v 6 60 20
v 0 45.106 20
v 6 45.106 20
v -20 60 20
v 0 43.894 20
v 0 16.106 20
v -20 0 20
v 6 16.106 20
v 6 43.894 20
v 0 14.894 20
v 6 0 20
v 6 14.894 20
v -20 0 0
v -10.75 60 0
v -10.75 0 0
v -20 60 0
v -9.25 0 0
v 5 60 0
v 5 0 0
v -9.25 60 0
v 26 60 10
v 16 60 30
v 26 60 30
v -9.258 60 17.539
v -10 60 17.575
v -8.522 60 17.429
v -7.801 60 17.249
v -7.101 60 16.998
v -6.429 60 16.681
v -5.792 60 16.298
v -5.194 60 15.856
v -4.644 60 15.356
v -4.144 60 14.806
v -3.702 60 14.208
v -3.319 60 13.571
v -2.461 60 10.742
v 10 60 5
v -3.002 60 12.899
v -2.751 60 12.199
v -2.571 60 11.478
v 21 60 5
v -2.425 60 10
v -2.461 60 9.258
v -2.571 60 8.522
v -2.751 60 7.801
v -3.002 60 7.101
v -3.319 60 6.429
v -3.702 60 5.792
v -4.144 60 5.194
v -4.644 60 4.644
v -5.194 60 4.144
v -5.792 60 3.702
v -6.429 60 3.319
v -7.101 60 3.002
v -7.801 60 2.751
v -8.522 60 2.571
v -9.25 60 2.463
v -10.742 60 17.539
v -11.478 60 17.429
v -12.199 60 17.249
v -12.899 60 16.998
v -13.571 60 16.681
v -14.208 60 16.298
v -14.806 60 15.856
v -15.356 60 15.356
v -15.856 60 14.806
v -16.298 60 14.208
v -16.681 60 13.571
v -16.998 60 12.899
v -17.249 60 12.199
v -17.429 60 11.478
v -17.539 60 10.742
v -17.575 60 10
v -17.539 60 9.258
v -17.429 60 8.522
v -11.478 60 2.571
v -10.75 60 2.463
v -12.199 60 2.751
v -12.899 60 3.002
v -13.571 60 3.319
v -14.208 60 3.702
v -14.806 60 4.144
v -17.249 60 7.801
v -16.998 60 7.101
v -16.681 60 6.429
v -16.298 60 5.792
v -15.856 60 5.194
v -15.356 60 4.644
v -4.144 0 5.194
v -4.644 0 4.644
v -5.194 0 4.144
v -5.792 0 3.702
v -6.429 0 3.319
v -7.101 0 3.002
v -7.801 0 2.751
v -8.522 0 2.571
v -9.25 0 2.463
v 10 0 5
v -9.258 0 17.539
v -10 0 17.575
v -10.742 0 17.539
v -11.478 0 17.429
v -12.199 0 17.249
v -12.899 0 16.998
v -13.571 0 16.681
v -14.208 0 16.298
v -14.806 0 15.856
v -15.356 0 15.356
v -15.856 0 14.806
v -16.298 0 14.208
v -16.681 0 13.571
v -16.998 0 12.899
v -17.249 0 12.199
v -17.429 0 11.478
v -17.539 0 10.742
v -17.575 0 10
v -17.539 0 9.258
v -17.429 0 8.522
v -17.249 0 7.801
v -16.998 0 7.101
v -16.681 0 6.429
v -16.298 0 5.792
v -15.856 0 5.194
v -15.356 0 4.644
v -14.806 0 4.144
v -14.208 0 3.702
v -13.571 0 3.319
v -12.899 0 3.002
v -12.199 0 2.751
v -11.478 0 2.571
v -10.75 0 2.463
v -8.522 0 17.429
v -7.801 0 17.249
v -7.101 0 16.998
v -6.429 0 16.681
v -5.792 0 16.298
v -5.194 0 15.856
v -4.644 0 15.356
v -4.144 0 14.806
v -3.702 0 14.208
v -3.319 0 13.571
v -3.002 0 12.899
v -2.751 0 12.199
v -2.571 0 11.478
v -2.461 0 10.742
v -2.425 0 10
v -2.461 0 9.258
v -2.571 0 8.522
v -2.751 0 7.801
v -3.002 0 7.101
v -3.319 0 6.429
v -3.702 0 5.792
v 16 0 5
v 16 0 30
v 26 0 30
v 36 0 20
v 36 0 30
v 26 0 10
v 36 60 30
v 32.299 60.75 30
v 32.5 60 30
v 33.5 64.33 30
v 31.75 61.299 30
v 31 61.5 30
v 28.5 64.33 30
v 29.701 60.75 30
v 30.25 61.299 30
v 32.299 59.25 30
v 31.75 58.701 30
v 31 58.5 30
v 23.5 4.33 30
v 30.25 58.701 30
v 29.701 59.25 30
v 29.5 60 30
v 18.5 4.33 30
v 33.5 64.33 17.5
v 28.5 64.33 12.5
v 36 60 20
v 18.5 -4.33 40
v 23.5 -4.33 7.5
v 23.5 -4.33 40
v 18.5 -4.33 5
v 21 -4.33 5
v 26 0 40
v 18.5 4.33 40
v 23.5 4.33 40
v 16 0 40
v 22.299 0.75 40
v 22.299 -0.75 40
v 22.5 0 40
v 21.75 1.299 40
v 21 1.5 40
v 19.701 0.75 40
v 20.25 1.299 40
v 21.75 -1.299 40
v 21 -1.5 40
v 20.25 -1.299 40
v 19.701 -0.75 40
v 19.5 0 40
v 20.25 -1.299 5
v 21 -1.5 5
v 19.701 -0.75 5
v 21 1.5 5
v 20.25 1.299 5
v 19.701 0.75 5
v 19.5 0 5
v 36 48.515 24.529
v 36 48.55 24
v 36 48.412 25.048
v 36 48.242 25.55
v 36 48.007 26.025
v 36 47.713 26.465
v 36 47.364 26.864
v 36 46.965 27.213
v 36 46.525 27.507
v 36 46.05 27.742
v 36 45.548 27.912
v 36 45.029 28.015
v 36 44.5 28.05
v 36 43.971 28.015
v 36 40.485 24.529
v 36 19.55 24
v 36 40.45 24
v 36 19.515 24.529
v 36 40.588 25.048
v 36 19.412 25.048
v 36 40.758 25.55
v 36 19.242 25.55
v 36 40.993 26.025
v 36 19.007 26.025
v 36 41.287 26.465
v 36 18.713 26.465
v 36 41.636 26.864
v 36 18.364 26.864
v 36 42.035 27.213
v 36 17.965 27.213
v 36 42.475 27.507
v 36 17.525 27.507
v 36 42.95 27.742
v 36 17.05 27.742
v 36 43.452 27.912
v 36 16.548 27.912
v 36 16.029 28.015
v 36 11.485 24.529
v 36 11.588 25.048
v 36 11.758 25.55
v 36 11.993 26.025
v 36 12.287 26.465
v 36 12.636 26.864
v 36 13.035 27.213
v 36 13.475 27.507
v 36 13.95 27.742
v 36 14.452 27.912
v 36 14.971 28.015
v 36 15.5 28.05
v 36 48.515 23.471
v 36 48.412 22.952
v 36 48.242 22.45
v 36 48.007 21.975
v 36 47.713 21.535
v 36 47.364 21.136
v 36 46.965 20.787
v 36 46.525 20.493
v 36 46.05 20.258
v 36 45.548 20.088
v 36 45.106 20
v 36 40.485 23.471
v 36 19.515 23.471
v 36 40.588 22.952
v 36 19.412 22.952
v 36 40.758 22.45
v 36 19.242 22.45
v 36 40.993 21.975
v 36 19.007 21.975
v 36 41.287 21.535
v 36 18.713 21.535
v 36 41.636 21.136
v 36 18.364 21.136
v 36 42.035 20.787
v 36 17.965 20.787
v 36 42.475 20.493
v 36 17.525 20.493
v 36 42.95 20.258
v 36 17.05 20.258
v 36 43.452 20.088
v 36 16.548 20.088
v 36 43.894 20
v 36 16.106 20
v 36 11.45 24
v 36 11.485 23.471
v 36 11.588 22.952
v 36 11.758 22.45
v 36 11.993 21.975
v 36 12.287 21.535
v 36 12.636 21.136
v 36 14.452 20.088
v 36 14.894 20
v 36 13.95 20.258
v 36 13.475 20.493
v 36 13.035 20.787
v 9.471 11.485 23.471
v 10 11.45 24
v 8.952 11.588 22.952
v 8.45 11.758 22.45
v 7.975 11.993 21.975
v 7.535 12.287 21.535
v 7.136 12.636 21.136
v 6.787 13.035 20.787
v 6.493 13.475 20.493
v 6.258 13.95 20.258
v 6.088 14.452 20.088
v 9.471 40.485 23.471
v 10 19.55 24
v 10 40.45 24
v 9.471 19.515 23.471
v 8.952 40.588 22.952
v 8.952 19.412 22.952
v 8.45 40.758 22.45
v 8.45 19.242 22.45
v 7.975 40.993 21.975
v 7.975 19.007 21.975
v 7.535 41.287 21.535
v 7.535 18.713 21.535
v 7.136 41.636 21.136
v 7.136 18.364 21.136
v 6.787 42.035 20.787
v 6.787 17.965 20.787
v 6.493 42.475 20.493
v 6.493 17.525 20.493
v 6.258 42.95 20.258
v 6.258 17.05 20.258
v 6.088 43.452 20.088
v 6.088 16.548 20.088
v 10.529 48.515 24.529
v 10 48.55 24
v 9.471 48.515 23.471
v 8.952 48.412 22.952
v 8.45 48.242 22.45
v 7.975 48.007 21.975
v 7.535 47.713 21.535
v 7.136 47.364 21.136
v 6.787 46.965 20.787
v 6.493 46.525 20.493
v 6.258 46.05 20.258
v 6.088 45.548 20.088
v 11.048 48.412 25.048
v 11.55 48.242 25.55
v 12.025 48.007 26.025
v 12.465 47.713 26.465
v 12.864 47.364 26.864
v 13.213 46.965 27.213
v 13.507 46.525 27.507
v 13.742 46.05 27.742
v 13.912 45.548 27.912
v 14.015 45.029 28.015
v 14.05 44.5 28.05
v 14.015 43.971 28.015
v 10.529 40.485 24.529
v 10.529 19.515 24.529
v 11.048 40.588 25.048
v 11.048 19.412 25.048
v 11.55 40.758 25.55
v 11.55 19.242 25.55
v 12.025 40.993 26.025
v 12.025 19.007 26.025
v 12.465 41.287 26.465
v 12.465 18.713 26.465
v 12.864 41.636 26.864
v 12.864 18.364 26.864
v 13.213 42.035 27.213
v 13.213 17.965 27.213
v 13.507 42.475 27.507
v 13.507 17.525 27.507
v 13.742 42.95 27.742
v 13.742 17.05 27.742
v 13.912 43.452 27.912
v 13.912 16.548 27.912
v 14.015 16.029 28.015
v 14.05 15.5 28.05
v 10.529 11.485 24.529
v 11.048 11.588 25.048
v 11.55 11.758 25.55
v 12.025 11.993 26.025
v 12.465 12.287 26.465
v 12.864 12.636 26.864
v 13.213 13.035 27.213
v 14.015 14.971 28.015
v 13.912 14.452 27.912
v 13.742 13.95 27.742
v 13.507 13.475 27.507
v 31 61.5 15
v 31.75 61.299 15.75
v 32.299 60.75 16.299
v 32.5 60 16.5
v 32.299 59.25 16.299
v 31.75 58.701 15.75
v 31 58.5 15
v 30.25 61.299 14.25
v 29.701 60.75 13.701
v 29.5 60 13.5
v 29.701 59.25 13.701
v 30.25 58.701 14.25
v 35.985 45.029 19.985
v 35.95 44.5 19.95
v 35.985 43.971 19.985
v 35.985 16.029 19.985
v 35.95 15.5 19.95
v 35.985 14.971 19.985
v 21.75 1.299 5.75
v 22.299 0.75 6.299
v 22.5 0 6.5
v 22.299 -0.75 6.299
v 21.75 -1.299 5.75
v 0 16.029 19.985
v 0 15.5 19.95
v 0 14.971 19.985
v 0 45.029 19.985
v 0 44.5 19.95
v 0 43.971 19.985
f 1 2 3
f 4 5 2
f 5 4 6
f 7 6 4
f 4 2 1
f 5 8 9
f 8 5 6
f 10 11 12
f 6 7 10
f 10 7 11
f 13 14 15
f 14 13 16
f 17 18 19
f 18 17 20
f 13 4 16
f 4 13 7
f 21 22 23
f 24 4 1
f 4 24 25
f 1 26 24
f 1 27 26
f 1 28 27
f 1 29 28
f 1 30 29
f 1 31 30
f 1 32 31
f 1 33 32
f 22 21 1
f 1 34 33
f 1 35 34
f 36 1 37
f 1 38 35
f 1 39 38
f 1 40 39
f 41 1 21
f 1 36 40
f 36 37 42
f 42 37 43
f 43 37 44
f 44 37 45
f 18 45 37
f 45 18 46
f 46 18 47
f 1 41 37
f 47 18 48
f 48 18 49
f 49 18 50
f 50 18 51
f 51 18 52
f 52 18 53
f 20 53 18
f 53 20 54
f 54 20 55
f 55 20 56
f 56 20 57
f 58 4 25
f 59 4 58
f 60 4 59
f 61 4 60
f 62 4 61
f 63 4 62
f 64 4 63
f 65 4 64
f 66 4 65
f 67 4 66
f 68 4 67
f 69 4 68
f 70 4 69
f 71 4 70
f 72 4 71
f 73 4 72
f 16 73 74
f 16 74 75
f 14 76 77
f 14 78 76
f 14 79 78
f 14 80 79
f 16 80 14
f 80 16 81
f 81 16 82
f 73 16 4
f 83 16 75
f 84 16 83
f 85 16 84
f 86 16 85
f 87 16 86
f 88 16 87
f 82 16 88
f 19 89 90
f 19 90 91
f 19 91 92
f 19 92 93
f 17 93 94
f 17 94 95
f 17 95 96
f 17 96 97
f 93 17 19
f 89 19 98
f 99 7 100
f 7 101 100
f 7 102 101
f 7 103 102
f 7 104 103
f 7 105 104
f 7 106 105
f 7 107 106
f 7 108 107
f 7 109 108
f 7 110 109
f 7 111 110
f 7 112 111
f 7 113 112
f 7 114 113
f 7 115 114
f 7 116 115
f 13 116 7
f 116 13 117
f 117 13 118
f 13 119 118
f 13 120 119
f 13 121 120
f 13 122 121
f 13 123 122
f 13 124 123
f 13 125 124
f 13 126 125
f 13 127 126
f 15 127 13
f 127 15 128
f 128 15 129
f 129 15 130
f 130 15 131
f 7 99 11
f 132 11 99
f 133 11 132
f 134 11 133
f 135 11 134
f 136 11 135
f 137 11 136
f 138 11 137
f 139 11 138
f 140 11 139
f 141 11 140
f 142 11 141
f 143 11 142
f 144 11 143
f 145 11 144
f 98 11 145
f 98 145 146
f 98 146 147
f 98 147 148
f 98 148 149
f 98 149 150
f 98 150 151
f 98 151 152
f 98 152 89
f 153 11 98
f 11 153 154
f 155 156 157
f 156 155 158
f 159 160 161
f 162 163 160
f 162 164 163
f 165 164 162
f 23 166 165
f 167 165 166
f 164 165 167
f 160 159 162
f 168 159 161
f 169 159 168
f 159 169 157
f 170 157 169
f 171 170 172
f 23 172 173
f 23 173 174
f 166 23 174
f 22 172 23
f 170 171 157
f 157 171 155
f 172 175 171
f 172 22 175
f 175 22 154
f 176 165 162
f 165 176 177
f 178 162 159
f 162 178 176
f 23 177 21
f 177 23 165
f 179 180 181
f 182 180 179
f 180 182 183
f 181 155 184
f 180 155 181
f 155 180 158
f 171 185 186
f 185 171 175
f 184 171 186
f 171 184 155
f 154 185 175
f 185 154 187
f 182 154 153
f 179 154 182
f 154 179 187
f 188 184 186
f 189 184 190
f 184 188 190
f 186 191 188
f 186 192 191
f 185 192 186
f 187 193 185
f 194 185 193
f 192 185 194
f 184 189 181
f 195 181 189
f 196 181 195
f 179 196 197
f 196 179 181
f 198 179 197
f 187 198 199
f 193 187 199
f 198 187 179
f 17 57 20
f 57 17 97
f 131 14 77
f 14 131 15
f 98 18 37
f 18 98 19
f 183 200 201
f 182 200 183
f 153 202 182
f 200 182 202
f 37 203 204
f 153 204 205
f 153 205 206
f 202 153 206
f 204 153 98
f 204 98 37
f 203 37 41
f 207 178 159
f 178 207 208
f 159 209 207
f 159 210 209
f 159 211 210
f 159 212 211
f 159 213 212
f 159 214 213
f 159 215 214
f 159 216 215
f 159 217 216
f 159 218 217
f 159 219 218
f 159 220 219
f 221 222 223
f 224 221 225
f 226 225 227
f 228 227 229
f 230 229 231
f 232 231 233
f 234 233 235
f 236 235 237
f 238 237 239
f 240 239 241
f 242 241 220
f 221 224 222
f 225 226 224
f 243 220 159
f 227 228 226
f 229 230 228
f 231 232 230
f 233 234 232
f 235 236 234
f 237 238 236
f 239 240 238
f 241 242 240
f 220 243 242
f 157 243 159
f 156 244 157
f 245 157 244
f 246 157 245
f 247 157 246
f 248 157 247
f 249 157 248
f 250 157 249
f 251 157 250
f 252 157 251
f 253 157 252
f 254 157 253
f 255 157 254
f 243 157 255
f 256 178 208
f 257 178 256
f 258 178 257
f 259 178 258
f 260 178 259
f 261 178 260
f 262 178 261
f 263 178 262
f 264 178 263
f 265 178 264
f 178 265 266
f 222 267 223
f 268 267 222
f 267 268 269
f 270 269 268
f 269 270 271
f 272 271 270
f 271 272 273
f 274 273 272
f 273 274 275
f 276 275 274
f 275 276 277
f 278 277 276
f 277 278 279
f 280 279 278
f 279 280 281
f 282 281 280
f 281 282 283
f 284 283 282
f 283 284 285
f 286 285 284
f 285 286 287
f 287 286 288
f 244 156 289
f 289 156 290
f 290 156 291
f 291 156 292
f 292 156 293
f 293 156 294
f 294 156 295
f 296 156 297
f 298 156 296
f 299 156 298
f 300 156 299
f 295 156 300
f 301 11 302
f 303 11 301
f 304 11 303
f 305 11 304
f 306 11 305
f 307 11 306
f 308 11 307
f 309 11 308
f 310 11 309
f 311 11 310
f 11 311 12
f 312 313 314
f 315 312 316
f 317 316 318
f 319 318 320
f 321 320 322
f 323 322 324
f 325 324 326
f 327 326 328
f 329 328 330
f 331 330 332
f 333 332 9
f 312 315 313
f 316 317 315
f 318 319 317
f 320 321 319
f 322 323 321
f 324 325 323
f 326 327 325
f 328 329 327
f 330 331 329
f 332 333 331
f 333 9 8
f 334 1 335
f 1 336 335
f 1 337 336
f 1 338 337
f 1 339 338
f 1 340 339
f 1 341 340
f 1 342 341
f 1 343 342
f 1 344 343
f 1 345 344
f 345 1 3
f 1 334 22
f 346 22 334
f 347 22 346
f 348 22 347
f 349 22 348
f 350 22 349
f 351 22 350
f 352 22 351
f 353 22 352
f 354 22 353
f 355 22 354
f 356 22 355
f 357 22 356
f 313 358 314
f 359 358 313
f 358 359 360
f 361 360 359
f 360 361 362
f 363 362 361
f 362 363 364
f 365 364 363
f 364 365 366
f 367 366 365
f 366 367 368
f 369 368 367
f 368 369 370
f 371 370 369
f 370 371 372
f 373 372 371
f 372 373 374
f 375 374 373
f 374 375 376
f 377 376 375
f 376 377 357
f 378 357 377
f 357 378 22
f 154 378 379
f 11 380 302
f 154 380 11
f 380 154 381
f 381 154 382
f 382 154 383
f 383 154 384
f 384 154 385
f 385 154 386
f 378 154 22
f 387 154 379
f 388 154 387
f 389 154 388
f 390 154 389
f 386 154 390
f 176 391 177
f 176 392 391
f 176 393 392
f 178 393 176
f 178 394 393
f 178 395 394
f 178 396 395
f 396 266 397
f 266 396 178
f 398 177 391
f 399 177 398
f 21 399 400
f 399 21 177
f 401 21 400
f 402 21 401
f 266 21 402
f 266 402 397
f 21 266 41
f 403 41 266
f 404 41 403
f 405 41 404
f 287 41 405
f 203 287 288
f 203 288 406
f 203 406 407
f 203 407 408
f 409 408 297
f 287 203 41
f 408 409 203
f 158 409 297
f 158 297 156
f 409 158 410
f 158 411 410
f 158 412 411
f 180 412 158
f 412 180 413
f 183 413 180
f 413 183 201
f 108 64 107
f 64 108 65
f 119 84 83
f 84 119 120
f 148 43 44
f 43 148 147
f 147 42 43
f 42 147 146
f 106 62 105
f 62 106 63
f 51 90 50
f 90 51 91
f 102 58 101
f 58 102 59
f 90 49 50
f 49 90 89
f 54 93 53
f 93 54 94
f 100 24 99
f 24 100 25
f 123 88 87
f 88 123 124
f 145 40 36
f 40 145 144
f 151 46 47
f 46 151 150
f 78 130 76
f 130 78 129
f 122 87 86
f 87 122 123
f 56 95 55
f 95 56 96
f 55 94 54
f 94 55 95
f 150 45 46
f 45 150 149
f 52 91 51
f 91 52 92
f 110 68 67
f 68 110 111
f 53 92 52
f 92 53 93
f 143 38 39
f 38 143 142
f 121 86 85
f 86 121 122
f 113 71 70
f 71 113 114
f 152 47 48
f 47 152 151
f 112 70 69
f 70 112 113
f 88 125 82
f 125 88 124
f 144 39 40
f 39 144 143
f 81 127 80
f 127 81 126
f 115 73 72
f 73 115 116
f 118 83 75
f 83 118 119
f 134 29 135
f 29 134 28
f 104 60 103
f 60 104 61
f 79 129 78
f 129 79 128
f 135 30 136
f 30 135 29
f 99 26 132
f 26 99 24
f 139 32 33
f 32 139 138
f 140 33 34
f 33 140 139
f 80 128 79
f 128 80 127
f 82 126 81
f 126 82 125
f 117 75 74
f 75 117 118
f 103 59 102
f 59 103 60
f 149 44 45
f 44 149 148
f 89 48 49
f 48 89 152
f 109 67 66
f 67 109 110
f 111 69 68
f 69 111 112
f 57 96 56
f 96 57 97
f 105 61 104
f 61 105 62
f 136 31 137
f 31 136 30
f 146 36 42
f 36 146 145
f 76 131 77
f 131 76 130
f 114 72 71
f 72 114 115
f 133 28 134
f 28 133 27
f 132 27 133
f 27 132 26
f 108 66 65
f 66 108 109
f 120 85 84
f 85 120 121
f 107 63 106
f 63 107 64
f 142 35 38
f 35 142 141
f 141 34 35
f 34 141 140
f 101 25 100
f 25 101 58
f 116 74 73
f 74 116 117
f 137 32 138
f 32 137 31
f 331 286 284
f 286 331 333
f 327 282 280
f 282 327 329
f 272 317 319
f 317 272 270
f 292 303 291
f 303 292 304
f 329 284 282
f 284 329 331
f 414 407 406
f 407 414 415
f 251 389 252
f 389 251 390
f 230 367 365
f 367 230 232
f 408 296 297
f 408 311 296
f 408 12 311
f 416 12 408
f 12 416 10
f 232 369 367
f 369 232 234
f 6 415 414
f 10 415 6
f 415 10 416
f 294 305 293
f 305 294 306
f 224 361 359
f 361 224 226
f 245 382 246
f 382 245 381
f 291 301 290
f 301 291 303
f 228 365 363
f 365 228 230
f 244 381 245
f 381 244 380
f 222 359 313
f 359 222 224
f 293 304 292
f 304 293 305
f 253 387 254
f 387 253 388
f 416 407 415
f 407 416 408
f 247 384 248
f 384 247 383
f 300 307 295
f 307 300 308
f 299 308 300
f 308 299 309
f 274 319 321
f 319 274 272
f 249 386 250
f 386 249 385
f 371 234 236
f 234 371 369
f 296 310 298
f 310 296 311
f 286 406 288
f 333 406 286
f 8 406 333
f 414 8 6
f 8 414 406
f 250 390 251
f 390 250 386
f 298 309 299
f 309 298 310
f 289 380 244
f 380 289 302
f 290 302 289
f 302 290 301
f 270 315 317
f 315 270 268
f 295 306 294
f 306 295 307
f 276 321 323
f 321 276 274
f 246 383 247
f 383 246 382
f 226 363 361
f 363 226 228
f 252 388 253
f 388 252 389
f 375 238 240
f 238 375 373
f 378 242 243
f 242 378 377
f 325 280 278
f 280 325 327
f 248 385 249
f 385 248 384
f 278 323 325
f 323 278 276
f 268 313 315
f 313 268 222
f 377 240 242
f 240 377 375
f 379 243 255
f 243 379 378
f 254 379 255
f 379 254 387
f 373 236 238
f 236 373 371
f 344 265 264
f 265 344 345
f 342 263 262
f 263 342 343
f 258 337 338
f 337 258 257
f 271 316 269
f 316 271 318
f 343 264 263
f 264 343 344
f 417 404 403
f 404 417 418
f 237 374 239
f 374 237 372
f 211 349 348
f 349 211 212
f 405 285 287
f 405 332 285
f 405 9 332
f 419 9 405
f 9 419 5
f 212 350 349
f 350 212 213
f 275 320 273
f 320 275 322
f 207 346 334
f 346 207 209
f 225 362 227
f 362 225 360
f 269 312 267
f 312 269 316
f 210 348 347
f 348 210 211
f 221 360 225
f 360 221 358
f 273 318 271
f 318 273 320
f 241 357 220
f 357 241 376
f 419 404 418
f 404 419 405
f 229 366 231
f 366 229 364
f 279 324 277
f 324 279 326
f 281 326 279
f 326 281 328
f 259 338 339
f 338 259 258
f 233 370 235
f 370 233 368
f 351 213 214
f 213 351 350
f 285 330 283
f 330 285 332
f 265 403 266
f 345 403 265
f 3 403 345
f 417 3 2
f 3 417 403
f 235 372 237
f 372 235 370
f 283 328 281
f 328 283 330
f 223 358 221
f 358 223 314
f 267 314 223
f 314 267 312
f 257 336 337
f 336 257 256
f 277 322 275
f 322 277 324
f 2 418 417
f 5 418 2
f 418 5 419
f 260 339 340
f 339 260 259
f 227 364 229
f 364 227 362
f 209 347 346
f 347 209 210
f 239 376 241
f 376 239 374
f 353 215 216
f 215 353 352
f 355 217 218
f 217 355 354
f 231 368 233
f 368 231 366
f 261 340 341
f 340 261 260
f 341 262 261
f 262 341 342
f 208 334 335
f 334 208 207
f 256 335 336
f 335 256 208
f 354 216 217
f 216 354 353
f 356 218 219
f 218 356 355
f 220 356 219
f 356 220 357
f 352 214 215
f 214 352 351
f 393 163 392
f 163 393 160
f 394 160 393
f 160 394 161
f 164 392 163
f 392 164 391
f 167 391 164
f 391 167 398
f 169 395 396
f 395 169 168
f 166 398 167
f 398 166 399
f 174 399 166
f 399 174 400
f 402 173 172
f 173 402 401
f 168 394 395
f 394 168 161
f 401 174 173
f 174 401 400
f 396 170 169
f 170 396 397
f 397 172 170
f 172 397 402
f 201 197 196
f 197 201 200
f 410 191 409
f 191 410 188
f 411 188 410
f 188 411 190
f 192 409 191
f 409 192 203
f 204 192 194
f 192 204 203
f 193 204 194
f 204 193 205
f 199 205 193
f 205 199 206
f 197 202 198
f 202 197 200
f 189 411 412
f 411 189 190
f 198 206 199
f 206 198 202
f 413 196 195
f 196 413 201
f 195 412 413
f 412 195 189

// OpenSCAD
difference()
{
    union()
    {
        translate([-20,0,0])
            cube([20,60,20]);
        
        cube([42,60,20]);
        
        translate([6,0,20])
            cube([42,60,10]);
        
        translate([21+10,60/2+30,0])
            cylinder(d=10,h=20+10,$fn=6);
        
        translate([21,60/2-30,0])
            cylinder(d=10,h=20+10+10,$fn=6);
    }
    union()
    {
        translate([-10-1.5/2,0,0])
            cube([1.5,60,5]);
        
        translate([5,0,0])
            rotate([0,45,0])
                cube([5*sqrt(2),60,5*sqrt(2)]);
        
        translate([10,-10,0])
            cube([12,80,5]);
        
        translate([36,0,0])
            cube([20,60,50]);
        
        translate([6,0,20])
            rotate([0,45+270,0])
                cube([10*sqrt(2),60,10*sqrt(2)]);
        
        translate([21-5,-10,0])
            rotate([0,45,0])
                cube([40,80,40]);
        
        translate([-10,0,10])
            rotate([270,0,0])
                cylinder(d=15.15,h=60,$fn=64);
        
        translate([0,60/2-29/2,20+4])
            rotate([0,90,0])
                cylinder(d=8.1,h=50,$fn=48);
        translate([0,60/2+29/2,20+4])
            rotate([0,90,0])
                cylinder(d=8.1,h=50,$fn=48);
        
        translate([21+10,60/2+30,0])
            cylinder(d=3,h=20+10,$fn=12);
        
        translate([21,60/2-30,0])
            cylinder(d=3,h=20+10+10,$fn=12);
        
        //translate([21-5,-10,0])
          //  cube([10,60+20,10]);
        
    }
}
